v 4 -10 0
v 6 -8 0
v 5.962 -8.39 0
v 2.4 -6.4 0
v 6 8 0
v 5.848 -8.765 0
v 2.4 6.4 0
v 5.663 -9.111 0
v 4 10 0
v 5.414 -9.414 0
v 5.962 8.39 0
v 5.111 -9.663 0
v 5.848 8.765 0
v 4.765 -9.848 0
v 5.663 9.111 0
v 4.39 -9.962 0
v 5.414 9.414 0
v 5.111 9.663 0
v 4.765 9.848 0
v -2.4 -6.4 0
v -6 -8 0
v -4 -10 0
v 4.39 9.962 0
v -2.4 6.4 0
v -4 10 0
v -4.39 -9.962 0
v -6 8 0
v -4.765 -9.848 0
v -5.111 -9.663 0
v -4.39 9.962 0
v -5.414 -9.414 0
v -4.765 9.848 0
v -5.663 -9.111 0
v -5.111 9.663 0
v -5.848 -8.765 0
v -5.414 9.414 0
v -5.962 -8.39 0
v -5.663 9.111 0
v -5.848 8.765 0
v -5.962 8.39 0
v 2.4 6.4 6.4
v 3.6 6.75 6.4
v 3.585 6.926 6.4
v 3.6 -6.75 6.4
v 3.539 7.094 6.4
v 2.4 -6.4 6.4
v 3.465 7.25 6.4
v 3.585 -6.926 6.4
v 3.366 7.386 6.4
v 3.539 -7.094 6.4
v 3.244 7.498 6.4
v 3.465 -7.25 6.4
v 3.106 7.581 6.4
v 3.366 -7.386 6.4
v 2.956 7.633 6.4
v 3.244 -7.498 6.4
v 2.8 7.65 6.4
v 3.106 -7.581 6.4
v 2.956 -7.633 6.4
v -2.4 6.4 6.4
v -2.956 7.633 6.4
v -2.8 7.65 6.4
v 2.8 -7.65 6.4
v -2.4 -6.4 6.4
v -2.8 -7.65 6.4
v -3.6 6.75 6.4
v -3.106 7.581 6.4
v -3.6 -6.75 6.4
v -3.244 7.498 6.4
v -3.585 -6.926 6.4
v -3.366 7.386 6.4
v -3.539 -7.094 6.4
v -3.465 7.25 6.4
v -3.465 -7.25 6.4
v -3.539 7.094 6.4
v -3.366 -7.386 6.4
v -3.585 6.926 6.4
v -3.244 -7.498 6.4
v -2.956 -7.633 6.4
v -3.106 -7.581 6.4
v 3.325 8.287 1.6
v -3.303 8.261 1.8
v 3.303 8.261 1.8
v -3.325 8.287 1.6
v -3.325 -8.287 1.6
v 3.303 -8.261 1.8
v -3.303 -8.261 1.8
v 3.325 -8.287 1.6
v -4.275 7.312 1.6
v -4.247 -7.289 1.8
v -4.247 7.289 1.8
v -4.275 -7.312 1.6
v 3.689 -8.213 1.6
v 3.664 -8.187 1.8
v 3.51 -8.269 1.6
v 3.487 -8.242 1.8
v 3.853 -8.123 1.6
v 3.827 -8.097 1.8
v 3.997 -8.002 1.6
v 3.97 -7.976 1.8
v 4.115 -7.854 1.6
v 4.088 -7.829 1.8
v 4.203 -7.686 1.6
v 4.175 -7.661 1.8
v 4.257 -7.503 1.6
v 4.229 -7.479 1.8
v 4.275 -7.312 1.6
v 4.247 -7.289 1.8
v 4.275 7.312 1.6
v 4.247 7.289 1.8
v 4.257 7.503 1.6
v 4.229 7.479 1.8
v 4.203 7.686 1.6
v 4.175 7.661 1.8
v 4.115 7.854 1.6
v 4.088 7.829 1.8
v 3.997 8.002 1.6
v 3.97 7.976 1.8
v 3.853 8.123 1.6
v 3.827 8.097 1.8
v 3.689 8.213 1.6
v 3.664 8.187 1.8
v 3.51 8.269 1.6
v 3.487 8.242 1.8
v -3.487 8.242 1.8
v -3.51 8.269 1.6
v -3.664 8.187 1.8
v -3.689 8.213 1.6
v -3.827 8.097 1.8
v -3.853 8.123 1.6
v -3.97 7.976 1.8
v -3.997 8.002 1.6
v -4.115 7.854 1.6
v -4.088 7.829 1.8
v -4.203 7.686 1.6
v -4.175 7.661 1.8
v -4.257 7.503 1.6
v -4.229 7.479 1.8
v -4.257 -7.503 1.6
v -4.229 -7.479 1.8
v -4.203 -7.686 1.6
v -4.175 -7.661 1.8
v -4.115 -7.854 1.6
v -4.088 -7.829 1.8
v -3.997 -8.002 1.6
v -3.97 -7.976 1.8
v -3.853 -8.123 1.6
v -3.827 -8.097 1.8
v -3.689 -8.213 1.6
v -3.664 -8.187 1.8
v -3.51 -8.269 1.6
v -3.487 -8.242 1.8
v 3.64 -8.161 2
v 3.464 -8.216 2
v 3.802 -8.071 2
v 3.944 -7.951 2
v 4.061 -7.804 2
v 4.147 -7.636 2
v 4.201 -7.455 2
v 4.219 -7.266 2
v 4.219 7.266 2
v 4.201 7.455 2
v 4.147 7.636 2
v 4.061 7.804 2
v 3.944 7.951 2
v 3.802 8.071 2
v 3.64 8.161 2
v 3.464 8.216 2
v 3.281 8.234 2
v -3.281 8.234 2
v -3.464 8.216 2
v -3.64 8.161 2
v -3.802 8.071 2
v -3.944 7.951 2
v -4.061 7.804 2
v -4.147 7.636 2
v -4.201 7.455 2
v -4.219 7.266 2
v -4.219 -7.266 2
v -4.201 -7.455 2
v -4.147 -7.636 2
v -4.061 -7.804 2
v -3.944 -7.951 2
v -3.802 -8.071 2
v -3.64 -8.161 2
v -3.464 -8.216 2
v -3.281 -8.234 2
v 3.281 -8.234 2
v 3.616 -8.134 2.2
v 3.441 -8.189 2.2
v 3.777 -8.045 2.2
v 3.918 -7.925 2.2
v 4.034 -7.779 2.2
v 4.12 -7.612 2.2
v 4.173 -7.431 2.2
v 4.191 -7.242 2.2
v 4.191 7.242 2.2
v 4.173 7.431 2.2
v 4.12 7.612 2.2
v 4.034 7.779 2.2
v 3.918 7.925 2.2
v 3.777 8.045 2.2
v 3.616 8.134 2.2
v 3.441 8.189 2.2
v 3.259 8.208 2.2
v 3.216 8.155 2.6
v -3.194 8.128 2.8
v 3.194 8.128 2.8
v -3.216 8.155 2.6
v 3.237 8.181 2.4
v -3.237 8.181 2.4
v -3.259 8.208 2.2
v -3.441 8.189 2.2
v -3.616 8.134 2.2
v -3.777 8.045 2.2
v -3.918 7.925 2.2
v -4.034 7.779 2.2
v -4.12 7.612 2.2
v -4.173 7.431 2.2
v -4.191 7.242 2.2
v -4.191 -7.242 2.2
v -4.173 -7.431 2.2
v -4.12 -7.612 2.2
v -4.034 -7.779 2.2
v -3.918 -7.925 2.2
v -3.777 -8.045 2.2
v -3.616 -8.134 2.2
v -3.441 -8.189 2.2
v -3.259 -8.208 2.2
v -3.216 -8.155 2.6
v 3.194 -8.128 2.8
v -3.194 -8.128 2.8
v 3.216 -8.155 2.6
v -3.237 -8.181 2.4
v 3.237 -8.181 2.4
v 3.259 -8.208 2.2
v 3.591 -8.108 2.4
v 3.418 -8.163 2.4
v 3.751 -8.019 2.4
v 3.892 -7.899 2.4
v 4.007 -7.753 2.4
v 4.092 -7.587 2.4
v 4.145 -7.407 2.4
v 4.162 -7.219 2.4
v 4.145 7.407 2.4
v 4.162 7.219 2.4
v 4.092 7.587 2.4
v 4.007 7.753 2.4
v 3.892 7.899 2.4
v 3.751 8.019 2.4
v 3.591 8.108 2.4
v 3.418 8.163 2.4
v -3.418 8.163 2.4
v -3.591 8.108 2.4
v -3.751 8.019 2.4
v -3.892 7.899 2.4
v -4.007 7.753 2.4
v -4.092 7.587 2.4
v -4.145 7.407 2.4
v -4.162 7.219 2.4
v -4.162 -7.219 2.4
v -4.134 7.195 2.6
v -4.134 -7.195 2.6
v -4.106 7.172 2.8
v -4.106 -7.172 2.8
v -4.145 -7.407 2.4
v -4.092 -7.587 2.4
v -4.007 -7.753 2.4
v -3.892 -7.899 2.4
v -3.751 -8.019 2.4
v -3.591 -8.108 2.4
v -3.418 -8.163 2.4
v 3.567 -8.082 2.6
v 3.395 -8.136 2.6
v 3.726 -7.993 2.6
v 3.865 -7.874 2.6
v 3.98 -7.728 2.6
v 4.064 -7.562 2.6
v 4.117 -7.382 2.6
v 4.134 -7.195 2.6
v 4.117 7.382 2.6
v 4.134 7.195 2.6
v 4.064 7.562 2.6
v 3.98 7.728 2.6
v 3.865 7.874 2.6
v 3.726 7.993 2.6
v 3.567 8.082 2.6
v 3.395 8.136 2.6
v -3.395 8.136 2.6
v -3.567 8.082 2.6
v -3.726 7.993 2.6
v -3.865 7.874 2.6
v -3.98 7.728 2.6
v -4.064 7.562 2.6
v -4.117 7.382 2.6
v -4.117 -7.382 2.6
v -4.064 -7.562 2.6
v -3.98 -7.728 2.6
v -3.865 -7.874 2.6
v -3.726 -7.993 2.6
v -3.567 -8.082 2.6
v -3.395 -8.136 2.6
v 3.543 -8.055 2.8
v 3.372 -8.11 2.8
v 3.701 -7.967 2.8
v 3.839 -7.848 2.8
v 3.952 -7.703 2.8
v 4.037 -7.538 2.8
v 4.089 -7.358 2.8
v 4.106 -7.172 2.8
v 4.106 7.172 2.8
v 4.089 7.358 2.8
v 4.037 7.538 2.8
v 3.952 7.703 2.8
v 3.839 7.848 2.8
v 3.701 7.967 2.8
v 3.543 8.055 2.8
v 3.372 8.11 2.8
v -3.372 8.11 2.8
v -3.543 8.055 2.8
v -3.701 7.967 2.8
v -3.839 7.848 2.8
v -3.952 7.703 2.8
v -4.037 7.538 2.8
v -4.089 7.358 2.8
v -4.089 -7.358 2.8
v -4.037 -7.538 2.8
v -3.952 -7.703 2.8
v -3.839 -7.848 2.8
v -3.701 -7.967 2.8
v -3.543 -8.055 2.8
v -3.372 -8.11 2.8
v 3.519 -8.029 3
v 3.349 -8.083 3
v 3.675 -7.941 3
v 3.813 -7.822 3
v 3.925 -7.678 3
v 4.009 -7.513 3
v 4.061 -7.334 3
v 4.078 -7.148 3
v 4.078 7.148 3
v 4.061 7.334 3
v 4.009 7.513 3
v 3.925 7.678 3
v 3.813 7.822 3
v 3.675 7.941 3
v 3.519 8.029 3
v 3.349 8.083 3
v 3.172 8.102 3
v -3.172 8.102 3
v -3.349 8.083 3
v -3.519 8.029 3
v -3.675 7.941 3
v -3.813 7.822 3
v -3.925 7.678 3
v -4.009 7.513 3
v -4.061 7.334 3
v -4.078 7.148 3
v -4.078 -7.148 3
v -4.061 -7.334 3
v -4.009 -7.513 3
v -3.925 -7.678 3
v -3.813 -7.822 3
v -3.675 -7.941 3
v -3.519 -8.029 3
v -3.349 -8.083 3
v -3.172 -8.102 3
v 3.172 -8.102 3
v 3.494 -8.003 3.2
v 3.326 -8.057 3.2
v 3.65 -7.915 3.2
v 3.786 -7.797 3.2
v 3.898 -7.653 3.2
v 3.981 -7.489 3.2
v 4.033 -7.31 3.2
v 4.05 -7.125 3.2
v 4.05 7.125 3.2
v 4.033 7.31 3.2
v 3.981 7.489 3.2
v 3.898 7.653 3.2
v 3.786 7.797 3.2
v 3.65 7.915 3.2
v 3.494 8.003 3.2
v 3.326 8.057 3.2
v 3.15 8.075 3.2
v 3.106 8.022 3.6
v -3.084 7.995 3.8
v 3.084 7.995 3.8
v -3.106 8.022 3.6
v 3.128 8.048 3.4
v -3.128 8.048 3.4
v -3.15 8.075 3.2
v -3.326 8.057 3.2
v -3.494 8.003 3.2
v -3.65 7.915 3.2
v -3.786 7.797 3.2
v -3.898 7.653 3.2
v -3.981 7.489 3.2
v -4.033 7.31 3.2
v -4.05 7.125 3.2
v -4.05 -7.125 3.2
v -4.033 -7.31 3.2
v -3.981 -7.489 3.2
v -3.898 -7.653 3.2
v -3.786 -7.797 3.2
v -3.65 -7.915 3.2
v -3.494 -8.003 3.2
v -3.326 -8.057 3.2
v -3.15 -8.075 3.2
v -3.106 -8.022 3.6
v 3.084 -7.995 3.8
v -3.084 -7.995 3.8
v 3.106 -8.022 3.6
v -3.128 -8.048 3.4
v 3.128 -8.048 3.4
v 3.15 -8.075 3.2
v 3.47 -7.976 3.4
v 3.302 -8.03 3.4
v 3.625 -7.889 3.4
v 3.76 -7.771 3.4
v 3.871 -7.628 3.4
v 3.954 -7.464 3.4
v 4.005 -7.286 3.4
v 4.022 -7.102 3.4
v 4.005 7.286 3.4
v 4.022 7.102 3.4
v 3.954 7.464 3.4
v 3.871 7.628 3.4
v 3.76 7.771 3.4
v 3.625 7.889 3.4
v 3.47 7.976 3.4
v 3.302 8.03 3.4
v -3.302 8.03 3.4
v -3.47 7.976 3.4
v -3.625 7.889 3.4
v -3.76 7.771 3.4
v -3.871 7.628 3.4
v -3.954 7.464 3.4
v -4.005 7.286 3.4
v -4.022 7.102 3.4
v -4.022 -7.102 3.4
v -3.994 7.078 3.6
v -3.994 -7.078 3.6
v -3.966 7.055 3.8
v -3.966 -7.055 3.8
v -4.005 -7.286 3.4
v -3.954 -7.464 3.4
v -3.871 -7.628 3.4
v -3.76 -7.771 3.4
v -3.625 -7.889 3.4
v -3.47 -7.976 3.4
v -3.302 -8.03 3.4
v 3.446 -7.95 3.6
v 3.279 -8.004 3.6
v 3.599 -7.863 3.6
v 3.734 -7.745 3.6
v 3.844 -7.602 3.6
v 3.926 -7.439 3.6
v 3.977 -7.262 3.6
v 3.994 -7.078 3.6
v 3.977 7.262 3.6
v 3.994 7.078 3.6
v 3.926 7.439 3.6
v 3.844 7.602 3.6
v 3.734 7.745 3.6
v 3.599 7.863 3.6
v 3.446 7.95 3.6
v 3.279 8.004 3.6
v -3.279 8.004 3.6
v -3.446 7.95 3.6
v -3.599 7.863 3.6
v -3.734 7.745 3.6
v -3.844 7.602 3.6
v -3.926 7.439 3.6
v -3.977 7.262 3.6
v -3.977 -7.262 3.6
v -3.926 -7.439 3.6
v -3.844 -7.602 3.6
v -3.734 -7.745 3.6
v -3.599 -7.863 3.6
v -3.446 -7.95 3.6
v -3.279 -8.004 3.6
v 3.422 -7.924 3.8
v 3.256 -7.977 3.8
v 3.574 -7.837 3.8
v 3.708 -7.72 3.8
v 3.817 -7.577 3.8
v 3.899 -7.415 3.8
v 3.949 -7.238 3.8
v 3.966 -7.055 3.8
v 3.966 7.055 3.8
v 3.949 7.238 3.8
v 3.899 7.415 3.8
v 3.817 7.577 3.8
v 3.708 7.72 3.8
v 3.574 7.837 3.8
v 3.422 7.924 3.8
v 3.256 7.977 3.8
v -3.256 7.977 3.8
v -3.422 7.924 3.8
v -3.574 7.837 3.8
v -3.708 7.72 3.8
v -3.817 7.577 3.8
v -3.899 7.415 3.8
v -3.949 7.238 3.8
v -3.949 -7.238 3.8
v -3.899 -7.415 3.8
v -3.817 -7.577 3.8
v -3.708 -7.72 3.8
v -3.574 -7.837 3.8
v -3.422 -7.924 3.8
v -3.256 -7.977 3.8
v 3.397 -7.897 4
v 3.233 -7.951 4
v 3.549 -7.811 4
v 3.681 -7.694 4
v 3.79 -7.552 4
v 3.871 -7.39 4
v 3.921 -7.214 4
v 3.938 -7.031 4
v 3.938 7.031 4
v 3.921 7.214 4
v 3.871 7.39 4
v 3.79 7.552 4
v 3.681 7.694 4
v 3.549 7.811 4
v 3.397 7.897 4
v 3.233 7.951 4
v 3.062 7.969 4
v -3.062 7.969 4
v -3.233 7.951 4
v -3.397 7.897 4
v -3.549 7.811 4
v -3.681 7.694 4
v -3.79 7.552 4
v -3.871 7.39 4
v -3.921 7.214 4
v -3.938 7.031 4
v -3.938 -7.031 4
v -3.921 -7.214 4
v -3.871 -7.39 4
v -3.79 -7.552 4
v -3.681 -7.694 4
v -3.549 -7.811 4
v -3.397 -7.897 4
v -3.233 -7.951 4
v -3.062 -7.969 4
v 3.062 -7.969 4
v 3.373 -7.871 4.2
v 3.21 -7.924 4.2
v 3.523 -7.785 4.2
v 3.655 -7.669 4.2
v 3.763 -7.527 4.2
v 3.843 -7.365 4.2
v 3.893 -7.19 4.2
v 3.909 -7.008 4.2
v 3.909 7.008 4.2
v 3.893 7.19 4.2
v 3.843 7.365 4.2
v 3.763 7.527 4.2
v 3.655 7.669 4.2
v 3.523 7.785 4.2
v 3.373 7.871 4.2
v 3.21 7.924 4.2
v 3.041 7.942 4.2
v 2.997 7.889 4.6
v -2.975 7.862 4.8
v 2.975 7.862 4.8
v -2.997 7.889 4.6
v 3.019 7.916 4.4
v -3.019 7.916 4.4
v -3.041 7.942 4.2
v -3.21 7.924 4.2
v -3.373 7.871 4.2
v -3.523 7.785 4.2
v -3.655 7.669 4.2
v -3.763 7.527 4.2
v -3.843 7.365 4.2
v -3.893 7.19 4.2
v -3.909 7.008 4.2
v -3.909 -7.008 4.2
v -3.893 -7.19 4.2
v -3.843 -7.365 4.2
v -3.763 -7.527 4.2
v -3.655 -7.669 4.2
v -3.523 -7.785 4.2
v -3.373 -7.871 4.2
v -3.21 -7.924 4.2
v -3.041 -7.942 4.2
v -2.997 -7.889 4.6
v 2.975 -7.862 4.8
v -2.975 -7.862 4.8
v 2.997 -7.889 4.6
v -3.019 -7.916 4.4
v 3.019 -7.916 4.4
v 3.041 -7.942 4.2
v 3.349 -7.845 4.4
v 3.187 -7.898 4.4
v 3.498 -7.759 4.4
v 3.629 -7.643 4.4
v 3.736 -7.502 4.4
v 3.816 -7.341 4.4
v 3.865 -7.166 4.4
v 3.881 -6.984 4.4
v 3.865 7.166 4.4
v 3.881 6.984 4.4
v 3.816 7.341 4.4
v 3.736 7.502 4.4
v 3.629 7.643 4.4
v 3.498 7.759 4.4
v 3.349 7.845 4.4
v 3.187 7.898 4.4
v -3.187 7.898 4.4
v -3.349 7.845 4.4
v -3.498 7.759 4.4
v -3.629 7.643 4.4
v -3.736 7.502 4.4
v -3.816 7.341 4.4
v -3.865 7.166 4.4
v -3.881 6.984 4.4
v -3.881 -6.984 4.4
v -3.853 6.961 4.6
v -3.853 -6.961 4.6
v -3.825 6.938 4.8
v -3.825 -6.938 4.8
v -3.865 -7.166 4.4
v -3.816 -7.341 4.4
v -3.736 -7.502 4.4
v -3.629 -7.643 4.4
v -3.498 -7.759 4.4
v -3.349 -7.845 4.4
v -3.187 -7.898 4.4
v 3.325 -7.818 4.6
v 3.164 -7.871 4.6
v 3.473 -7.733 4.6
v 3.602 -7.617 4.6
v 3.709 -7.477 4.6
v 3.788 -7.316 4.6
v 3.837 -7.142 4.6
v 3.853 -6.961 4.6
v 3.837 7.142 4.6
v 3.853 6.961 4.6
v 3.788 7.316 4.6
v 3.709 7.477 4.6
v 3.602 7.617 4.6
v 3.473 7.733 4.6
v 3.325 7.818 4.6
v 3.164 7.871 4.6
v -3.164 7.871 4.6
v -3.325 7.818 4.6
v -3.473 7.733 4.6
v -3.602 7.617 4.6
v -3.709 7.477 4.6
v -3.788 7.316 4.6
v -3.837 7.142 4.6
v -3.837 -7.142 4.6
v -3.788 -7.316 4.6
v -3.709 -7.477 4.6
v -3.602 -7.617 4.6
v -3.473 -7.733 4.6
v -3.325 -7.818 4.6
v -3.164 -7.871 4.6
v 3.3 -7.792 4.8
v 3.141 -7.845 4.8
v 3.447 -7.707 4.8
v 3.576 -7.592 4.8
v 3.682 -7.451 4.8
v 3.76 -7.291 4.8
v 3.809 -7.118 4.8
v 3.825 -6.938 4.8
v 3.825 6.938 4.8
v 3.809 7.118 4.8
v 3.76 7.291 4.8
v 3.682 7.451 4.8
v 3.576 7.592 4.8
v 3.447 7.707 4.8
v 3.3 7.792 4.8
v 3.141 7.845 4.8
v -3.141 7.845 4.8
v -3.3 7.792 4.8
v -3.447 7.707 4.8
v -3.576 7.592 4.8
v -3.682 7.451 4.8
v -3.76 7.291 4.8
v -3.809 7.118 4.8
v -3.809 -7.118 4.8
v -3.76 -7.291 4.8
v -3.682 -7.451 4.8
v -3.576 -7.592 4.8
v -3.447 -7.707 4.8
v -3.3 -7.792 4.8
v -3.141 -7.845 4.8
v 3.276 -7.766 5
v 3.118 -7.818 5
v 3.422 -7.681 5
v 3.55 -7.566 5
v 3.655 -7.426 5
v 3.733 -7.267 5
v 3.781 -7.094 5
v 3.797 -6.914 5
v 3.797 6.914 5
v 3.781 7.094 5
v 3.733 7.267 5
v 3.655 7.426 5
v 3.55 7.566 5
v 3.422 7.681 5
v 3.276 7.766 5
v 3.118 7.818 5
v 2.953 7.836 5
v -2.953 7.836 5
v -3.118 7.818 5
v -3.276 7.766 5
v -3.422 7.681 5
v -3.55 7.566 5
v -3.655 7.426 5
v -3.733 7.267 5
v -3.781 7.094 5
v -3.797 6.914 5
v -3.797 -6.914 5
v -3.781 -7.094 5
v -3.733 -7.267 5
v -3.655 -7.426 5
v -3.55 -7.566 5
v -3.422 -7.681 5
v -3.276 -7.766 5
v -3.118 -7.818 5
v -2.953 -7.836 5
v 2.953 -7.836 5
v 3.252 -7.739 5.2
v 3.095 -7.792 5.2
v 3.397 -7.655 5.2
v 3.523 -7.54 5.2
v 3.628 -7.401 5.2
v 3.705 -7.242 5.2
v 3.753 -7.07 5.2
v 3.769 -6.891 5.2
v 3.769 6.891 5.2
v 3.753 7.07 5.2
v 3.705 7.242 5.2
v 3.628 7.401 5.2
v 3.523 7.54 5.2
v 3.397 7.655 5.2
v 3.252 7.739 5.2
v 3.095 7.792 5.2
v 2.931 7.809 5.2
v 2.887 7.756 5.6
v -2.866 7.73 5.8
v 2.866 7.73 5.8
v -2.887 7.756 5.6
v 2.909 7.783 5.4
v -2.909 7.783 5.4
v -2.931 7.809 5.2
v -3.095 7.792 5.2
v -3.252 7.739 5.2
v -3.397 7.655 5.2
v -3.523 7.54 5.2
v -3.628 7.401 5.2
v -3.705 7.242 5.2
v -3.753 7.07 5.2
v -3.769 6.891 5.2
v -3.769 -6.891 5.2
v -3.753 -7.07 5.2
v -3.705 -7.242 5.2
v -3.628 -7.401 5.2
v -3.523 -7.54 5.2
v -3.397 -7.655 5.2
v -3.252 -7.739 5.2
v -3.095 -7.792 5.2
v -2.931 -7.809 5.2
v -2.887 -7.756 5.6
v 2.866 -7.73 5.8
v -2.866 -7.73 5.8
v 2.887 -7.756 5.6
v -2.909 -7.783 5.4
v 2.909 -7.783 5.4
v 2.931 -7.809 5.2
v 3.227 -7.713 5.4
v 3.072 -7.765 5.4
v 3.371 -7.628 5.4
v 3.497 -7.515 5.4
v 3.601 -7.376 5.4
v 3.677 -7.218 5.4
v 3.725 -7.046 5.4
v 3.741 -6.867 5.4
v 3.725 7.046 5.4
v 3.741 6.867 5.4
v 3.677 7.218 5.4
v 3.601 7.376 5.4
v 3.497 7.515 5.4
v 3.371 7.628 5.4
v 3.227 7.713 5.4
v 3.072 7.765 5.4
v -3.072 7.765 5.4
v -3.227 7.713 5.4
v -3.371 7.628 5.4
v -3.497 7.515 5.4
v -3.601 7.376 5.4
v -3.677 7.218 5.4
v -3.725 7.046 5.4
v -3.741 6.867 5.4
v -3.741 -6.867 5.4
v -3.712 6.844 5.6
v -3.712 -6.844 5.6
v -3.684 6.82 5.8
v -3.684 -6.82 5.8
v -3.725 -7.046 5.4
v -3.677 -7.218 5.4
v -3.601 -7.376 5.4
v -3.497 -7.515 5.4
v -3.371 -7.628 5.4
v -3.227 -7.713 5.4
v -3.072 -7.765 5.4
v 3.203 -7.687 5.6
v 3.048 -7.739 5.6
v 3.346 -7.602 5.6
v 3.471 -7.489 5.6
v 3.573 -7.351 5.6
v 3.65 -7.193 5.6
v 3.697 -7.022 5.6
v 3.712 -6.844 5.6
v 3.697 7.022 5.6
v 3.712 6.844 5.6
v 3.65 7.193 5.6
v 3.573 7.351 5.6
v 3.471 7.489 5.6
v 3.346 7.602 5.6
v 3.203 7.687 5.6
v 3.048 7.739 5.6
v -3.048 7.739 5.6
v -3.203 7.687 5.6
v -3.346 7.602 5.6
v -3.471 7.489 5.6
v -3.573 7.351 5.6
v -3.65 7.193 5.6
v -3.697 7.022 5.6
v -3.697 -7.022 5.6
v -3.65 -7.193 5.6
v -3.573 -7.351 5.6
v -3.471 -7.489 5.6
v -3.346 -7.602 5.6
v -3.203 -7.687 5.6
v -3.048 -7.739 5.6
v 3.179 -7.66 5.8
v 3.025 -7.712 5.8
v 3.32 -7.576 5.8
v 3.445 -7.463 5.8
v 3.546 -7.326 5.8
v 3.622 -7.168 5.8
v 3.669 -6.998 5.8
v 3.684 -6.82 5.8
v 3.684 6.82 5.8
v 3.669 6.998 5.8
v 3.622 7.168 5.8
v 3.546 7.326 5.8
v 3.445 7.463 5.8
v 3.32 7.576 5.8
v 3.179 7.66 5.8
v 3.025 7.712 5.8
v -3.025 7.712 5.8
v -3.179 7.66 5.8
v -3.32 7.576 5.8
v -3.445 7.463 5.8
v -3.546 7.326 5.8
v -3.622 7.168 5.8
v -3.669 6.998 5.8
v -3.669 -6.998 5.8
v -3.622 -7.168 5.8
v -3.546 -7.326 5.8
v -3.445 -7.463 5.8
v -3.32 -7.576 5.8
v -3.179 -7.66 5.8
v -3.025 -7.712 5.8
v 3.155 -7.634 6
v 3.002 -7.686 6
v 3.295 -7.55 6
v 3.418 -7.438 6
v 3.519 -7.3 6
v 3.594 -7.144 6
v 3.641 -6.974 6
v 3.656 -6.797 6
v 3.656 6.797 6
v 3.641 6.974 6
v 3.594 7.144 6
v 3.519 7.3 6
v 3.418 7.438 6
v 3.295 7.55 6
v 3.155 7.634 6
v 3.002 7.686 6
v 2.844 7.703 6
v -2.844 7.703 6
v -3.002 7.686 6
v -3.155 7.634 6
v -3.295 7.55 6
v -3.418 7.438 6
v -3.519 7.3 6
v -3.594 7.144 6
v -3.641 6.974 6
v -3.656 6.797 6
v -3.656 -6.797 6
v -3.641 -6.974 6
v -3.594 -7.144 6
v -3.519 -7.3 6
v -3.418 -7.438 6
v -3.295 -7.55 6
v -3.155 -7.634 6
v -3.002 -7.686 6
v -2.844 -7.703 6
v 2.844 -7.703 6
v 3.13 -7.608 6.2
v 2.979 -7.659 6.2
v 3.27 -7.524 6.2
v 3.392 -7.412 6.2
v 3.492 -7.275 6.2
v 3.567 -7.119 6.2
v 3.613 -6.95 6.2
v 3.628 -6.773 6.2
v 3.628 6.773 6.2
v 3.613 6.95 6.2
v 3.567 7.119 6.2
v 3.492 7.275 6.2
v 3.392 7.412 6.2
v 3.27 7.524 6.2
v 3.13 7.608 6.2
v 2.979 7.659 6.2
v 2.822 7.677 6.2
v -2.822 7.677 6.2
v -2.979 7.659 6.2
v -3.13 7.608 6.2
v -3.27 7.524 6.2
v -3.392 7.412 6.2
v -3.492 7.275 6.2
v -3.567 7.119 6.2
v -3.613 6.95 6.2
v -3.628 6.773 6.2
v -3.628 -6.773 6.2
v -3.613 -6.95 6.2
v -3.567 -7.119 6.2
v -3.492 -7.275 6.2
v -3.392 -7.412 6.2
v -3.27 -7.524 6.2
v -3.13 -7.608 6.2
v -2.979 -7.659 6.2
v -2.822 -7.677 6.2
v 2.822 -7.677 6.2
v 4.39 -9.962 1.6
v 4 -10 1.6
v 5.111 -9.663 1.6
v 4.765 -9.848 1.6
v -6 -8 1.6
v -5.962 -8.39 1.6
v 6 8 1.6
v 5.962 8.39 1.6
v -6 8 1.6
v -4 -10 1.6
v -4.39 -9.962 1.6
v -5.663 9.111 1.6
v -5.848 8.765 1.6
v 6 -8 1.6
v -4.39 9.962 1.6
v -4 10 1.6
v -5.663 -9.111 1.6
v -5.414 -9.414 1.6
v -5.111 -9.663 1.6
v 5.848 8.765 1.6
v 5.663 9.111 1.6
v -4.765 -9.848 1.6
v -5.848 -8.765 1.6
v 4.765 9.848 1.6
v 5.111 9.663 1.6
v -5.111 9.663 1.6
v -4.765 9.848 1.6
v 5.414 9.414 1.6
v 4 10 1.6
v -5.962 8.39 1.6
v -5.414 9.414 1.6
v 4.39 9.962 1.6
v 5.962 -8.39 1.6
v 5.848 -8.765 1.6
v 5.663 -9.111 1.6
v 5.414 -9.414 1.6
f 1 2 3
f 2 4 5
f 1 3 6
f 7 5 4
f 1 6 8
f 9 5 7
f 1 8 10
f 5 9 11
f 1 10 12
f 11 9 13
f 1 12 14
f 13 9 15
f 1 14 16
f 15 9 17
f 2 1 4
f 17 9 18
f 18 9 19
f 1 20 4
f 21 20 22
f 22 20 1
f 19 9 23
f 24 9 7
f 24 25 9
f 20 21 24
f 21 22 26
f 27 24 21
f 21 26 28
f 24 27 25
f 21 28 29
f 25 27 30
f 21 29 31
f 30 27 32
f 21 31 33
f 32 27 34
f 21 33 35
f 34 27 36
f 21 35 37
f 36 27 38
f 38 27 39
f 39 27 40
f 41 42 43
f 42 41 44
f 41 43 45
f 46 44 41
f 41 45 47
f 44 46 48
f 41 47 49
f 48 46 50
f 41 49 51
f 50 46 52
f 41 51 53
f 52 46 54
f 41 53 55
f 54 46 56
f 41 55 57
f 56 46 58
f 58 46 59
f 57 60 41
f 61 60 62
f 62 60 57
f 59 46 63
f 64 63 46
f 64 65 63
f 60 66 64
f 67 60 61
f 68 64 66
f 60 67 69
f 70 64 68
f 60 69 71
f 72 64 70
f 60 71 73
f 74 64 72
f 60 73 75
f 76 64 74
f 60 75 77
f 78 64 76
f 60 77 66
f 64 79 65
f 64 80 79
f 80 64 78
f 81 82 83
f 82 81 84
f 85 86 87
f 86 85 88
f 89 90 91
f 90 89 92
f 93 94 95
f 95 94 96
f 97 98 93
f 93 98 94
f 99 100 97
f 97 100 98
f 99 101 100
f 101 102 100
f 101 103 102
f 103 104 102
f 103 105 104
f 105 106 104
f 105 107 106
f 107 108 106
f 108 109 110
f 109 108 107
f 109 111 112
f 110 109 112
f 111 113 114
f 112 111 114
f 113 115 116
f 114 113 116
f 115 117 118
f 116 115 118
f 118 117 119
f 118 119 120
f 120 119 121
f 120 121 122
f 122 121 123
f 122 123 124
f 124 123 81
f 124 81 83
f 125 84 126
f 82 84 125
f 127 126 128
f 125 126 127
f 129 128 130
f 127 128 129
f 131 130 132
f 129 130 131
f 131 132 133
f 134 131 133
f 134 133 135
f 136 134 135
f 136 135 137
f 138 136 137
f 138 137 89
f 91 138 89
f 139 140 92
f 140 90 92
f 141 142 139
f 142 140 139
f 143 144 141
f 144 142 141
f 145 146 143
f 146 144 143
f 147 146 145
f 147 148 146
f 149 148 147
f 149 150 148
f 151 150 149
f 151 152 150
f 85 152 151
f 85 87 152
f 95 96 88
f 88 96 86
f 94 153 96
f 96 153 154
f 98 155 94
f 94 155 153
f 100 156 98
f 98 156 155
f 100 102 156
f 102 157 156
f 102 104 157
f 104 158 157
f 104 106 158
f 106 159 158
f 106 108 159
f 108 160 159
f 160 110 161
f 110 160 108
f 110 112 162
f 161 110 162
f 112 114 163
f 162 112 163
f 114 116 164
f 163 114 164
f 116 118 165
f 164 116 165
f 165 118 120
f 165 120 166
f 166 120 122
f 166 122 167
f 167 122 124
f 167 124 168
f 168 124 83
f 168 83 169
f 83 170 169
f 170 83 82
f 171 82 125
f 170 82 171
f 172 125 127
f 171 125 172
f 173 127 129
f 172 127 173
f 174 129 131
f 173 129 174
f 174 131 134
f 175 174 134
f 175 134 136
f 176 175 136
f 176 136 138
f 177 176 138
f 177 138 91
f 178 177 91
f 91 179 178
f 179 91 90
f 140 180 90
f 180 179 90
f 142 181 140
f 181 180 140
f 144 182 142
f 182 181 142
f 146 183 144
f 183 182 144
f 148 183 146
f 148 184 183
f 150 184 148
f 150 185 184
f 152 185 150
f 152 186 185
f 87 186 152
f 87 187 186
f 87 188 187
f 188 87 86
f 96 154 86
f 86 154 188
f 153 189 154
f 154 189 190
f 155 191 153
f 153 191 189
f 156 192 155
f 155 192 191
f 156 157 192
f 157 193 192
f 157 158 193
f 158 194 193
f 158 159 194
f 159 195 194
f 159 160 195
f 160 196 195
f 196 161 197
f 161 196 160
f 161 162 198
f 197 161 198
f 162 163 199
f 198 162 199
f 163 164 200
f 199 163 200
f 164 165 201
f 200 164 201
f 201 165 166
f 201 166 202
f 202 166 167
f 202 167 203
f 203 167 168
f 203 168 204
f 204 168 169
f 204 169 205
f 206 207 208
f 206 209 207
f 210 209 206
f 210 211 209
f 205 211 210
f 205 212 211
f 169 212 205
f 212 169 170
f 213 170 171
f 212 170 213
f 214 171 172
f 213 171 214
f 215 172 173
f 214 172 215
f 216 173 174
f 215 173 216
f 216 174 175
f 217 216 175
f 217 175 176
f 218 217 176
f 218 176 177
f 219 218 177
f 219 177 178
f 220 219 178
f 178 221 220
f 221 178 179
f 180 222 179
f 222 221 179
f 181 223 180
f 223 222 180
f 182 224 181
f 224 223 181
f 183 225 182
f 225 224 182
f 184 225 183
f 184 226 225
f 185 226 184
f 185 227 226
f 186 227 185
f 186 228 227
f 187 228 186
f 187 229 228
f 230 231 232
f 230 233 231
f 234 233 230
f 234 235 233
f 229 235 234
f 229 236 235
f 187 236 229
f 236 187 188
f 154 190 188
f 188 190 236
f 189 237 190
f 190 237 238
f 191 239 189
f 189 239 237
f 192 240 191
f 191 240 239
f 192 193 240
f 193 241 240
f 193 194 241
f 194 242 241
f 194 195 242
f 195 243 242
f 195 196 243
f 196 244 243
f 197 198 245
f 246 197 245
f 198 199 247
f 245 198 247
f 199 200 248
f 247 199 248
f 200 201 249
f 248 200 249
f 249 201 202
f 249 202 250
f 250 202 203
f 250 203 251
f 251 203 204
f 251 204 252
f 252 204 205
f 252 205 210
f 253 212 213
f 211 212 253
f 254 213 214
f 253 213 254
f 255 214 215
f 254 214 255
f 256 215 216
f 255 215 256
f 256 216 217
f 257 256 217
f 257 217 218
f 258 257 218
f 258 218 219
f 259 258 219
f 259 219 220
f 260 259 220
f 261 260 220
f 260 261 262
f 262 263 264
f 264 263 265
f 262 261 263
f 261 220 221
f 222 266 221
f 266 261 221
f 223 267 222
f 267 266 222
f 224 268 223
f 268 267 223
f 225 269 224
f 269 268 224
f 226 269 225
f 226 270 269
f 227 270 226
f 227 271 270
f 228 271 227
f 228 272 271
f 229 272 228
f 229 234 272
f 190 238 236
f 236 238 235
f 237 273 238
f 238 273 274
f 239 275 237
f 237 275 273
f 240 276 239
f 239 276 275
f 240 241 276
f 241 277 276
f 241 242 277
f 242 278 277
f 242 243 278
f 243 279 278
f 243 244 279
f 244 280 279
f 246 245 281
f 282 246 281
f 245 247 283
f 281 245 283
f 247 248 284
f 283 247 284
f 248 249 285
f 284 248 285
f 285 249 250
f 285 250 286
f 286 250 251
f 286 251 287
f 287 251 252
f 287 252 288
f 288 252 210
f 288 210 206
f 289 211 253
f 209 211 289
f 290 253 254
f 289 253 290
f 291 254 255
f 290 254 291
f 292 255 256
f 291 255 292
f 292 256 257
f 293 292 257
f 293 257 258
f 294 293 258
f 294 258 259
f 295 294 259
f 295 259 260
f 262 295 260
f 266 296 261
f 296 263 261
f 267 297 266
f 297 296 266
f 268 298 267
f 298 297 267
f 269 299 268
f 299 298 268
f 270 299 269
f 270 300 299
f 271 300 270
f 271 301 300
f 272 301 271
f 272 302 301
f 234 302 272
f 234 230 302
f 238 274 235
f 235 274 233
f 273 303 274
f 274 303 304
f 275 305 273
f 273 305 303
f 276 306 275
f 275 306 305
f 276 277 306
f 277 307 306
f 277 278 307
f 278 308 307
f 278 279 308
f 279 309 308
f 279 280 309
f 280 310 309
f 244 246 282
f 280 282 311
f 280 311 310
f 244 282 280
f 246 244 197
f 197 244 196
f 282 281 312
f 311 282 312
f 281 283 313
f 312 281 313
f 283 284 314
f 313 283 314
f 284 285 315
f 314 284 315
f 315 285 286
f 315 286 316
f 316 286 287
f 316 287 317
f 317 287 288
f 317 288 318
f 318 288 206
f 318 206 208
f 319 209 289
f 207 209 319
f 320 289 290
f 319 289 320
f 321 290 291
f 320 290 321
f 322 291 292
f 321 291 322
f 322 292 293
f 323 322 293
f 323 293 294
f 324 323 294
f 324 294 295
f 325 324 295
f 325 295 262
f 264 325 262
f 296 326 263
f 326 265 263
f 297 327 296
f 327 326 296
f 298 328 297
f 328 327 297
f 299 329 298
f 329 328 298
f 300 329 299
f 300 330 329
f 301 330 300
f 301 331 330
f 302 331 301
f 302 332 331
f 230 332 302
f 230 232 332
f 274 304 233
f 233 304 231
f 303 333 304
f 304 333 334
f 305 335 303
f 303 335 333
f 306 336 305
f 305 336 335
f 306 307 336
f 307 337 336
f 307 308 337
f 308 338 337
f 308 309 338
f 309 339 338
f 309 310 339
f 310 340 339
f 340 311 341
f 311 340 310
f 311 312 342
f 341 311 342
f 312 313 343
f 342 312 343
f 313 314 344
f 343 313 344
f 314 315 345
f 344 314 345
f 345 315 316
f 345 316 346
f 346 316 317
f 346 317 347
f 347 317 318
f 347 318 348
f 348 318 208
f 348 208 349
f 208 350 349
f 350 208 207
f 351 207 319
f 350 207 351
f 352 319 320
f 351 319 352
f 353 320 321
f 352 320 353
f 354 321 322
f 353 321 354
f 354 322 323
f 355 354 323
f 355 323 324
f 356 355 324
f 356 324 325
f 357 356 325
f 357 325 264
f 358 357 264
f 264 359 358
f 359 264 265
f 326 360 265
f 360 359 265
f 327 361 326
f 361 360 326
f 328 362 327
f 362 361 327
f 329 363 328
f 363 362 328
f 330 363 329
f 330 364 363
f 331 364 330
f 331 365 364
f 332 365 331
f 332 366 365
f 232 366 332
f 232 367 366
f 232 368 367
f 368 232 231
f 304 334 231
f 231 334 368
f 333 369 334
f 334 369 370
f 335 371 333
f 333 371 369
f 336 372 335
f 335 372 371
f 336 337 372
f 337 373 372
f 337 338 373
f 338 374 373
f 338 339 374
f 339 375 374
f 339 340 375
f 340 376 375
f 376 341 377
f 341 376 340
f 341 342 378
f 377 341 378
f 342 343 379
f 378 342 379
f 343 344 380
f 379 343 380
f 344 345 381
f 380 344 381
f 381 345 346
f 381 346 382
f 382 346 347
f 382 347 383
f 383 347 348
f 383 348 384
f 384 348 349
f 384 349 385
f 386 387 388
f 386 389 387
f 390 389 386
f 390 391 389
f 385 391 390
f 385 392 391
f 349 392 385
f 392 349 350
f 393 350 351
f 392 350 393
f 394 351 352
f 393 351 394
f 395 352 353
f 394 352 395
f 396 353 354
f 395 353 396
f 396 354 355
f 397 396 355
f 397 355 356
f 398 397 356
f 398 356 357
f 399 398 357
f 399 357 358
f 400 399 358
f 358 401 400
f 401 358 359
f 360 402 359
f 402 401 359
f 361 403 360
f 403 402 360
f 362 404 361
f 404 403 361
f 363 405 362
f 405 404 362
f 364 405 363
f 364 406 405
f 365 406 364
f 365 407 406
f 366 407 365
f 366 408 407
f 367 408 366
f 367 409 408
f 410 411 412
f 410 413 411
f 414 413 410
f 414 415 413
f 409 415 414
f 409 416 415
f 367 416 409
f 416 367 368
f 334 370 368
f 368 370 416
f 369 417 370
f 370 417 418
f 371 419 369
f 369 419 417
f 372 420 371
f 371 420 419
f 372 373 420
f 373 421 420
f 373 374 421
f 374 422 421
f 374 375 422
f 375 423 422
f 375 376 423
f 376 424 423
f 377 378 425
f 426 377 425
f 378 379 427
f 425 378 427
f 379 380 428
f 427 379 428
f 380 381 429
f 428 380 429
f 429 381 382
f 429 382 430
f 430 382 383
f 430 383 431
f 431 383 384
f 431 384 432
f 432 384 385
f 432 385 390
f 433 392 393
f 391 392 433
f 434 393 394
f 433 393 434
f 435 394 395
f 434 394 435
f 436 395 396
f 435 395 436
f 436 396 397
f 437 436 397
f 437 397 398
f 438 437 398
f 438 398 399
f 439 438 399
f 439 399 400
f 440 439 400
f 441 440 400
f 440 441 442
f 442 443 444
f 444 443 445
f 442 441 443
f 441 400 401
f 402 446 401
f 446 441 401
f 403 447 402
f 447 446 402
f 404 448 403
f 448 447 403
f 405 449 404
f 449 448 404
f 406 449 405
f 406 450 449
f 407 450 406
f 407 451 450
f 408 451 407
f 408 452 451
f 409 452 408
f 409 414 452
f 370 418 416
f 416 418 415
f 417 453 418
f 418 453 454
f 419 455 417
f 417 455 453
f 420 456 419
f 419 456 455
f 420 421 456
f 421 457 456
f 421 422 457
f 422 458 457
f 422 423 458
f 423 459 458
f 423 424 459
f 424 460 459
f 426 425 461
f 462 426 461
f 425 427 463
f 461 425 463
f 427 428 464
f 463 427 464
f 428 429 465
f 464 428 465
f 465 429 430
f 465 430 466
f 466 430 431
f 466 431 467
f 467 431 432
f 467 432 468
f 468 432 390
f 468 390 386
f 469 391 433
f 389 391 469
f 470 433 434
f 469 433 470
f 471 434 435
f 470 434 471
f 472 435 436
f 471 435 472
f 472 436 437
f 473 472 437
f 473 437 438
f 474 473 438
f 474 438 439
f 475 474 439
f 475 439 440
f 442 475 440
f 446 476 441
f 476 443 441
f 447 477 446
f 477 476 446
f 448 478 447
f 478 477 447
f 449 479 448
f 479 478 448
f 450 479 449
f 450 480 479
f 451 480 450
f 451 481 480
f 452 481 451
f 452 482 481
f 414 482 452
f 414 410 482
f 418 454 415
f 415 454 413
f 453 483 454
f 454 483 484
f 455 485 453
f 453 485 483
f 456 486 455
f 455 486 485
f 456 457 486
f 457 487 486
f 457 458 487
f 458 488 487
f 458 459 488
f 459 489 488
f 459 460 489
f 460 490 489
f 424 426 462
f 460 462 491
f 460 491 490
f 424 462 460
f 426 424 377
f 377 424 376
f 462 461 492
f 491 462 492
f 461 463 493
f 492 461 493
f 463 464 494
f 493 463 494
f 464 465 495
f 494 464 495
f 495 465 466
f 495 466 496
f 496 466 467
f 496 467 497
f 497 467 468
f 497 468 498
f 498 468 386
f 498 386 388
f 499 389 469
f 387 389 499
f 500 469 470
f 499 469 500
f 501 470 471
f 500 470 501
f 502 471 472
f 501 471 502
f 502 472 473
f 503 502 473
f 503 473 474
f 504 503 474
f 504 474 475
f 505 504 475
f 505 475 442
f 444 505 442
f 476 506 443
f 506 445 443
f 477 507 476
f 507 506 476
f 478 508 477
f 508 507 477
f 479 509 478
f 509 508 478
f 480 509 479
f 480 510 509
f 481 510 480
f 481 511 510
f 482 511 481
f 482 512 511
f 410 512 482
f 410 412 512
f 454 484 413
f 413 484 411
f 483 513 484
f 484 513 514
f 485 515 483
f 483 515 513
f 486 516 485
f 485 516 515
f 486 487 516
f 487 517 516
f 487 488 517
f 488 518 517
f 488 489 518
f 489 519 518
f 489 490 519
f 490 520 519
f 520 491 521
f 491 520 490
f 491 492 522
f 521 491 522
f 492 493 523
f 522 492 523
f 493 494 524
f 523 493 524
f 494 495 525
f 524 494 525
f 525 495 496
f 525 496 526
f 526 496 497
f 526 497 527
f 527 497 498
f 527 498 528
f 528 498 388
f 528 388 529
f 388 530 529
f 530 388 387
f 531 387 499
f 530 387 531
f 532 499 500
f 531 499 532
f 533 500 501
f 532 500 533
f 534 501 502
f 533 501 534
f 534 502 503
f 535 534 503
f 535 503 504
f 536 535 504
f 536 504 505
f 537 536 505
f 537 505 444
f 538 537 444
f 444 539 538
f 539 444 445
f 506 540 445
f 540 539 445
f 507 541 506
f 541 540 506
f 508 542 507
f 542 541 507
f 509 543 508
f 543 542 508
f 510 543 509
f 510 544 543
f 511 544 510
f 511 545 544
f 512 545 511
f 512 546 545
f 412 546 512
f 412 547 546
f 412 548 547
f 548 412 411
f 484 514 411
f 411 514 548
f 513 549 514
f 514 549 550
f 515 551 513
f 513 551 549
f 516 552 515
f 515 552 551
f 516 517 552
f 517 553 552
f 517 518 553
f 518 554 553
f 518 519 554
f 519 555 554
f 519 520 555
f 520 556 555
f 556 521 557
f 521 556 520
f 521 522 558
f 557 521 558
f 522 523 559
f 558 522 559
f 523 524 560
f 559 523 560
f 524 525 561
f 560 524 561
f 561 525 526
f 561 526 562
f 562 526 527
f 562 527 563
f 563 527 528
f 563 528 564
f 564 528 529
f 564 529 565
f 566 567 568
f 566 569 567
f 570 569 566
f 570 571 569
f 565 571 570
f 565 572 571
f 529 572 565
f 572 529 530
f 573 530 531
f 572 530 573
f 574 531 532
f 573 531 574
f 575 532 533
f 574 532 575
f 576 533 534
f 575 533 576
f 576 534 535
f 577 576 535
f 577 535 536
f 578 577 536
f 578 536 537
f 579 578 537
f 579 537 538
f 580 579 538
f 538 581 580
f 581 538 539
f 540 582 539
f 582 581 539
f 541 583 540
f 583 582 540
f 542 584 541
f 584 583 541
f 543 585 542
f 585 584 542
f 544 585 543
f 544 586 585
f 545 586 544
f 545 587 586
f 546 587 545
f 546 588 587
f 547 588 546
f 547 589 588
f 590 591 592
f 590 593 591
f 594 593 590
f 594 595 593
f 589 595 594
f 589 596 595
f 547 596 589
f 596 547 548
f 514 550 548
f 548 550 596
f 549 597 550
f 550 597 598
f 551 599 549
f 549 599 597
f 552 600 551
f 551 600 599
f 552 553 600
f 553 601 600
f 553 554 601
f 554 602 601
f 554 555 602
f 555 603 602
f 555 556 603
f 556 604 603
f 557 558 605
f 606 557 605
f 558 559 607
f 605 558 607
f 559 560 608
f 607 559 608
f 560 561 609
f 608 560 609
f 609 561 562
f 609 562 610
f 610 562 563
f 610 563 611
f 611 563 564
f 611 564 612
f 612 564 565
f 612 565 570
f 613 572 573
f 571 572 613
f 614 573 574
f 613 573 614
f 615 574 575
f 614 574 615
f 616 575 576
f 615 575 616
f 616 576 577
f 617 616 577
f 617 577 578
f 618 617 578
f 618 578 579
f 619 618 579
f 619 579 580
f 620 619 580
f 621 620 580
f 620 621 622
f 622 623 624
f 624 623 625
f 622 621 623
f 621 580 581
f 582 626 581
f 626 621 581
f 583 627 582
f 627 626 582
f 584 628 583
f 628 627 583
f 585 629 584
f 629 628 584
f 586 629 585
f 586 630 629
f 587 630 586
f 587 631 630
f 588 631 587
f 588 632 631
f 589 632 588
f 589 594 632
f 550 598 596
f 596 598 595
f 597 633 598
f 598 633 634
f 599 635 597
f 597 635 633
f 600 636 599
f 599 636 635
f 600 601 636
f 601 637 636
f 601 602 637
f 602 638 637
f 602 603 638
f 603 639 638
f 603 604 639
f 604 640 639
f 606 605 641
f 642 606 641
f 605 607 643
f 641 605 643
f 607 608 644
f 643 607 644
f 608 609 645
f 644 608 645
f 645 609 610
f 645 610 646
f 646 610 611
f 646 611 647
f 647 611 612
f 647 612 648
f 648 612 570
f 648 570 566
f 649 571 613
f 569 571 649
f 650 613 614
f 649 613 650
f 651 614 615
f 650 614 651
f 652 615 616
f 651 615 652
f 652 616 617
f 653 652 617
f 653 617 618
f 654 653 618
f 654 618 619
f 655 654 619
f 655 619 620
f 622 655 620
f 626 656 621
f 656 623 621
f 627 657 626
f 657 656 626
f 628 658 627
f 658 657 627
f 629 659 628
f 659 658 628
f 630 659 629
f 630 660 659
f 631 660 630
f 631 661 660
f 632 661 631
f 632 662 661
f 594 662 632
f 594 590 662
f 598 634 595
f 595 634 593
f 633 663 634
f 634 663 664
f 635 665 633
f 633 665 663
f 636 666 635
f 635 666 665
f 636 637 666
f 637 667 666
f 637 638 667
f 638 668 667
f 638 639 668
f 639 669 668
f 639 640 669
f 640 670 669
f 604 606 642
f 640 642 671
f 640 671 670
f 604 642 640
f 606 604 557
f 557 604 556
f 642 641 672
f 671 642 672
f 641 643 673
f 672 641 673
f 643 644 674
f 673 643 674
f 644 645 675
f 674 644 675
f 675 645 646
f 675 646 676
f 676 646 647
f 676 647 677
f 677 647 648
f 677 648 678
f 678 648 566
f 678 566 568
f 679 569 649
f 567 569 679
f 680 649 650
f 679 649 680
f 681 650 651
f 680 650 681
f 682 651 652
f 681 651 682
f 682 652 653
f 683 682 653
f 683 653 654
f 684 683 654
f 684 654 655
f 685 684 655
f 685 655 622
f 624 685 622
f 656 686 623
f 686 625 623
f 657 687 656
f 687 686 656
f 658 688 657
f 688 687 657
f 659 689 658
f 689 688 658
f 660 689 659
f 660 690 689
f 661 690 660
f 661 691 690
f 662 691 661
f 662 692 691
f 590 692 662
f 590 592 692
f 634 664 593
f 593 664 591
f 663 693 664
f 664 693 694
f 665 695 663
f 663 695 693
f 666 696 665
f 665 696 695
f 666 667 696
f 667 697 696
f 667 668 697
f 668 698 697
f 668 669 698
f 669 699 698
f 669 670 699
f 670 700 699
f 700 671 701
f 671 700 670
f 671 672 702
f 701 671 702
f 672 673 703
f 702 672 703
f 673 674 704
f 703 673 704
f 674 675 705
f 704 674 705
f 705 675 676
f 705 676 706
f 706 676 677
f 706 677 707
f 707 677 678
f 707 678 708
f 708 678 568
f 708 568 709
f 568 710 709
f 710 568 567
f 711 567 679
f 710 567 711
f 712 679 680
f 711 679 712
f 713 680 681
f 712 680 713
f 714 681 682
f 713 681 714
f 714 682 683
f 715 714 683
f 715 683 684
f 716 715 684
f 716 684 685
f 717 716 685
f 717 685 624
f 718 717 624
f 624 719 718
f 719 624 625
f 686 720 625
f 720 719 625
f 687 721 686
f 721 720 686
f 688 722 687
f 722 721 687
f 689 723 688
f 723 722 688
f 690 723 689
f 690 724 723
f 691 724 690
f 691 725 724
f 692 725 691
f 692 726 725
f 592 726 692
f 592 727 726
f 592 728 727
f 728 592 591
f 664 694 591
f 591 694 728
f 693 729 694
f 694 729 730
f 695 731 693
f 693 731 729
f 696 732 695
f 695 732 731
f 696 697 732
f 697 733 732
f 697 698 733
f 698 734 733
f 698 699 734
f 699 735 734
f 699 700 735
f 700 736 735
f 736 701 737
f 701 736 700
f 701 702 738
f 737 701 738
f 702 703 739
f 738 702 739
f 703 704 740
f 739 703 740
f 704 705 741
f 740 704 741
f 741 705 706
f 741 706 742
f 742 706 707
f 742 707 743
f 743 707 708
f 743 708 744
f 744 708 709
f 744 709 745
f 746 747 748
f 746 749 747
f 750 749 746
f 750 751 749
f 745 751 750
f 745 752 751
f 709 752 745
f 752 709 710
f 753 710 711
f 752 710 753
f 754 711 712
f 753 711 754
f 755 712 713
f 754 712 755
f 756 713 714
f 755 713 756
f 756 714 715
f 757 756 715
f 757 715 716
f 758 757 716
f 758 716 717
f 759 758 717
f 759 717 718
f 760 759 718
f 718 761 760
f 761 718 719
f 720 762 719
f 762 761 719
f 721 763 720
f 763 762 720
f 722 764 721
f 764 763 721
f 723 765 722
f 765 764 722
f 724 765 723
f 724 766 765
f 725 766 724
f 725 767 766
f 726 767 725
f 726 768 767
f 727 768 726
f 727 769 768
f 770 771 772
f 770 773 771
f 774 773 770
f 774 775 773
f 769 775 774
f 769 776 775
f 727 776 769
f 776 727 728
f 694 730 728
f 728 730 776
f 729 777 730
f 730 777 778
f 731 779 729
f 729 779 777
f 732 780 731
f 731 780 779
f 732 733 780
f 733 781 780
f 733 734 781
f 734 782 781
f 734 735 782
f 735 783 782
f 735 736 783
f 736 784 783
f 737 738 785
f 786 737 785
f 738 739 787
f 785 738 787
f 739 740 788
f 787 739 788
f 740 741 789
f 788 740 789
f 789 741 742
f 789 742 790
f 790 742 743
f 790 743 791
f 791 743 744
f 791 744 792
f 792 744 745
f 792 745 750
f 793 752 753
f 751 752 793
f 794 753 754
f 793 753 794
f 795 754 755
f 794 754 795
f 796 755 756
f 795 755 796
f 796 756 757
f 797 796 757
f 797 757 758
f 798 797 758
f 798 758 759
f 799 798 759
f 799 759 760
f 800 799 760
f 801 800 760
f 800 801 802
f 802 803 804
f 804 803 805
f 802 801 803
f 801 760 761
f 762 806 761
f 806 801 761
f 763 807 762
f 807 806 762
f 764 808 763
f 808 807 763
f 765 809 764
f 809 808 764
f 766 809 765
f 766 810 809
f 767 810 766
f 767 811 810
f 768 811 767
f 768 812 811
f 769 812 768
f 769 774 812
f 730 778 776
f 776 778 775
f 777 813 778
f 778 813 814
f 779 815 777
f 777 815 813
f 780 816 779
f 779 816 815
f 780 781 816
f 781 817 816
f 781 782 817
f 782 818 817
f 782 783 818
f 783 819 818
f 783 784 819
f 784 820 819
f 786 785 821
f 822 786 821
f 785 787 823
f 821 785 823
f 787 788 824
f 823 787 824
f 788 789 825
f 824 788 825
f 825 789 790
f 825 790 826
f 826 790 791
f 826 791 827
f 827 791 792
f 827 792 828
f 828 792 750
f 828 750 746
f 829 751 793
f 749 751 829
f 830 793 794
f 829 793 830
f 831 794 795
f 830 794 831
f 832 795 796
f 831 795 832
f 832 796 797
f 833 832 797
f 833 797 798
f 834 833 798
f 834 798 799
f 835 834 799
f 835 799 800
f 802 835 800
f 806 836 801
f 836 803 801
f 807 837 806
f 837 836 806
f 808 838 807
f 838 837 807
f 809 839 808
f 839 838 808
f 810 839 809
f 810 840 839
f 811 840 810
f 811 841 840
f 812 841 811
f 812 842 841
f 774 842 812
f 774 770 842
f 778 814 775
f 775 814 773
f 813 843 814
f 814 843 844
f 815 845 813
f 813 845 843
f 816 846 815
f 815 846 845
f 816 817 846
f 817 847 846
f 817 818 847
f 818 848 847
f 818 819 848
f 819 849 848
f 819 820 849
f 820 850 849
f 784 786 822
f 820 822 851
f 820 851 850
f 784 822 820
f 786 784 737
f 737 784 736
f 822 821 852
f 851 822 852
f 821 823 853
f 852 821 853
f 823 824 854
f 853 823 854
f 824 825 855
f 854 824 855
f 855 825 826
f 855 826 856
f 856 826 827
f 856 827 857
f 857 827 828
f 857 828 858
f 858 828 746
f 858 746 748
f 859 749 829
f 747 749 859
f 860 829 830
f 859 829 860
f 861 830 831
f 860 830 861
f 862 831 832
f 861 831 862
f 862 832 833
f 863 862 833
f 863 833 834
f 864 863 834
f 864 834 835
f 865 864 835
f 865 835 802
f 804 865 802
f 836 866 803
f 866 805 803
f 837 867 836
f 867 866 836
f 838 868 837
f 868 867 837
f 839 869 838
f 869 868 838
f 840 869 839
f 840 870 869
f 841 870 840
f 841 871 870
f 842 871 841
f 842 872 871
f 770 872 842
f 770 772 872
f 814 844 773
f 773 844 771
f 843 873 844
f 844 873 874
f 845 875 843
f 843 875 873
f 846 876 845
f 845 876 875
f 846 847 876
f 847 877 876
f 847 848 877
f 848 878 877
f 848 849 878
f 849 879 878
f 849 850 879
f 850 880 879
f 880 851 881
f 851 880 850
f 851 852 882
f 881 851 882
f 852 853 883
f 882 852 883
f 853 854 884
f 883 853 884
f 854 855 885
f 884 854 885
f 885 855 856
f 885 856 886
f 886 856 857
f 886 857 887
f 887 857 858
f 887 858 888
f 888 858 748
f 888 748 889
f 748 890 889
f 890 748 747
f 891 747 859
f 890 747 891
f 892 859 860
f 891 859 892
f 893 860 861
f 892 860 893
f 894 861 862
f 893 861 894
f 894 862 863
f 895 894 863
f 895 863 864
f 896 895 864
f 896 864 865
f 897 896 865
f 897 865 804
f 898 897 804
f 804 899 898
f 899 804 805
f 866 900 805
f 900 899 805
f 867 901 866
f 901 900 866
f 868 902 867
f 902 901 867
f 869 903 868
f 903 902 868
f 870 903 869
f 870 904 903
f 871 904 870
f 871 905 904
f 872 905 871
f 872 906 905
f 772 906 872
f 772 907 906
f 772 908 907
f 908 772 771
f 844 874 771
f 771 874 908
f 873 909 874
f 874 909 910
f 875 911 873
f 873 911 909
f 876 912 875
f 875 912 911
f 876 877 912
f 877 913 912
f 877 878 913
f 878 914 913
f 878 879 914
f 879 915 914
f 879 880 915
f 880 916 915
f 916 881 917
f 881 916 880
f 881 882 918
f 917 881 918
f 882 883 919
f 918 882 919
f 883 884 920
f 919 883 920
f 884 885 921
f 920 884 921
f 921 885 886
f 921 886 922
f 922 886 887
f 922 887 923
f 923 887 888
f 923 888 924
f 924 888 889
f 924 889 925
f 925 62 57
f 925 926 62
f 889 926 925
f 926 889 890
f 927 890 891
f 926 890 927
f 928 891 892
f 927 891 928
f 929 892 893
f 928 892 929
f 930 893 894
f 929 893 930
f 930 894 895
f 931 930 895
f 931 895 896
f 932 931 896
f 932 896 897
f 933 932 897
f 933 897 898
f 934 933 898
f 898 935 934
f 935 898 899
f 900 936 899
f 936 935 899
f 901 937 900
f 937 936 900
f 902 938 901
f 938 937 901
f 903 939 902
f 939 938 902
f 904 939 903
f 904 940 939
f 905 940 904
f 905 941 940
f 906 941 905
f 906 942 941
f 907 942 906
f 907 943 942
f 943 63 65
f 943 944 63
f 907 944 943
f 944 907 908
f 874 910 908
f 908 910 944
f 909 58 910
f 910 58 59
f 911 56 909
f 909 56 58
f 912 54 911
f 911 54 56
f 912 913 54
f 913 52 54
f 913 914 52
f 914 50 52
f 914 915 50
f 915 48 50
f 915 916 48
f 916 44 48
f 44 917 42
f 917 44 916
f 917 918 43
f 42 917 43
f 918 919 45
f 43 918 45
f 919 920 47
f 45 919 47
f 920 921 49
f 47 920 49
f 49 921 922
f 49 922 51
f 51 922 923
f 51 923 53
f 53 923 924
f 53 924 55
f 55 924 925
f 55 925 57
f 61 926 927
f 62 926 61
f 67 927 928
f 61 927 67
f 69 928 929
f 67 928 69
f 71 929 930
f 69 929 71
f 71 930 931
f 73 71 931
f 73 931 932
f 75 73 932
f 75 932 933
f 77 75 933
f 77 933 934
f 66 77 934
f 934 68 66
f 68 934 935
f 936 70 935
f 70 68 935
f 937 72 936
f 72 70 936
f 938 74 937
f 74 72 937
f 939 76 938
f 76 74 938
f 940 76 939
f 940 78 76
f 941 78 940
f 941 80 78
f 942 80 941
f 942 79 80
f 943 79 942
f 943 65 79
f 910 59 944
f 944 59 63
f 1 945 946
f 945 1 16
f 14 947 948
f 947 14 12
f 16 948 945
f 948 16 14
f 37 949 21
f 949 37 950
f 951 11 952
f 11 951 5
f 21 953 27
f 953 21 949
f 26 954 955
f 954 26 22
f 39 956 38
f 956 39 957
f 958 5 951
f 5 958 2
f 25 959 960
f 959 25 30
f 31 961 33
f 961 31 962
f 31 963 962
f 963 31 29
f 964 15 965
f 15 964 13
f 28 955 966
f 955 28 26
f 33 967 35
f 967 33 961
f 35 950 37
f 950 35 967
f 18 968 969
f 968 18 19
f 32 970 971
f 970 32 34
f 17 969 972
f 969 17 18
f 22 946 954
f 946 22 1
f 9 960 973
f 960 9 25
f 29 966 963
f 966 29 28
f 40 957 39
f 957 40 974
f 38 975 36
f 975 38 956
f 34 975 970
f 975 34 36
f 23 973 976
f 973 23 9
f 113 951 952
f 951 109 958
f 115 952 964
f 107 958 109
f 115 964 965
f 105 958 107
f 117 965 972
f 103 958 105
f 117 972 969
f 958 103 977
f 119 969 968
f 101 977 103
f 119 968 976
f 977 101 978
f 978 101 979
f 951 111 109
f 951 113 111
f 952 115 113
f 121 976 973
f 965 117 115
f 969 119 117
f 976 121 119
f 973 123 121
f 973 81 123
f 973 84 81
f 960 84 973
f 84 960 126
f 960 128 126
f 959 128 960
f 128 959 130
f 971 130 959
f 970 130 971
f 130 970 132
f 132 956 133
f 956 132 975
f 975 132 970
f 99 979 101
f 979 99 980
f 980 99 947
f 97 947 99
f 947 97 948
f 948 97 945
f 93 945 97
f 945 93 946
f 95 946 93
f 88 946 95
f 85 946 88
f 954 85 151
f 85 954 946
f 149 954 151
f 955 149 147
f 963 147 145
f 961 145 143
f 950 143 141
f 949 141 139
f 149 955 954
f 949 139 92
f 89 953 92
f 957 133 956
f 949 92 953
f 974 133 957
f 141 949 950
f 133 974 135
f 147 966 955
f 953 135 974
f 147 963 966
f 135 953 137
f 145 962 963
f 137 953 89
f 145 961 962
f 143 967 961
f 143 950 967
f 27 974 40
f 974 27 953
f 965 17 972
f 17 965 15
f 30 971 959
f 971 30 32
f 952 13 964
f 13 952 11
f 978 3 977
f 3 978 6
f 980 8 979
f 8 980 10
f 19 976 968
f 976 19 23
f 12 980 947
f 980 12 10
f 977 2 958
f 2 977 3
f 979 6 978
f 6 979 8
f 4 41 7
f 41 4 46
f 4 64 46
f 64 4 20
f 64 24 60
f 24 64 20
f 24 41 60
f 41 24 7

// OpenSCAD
W=1.6;

$fn=32;

A=8;
B=16;

O1=1;
O2=2;

difference () {
    union() {
        linear_extrude(4*W,scale=[(A-W)/A,(B-W)/B])
        offset(r=O1)
        square([A-O1,B-O1],center=true);

        linear_extrude(W)
        offset(r=O2)
        square([A,B],center=true);
    }
    linear_extrude(100,center=true)
    offset(r=-W)
    square([A,B],center=true);
    
}
